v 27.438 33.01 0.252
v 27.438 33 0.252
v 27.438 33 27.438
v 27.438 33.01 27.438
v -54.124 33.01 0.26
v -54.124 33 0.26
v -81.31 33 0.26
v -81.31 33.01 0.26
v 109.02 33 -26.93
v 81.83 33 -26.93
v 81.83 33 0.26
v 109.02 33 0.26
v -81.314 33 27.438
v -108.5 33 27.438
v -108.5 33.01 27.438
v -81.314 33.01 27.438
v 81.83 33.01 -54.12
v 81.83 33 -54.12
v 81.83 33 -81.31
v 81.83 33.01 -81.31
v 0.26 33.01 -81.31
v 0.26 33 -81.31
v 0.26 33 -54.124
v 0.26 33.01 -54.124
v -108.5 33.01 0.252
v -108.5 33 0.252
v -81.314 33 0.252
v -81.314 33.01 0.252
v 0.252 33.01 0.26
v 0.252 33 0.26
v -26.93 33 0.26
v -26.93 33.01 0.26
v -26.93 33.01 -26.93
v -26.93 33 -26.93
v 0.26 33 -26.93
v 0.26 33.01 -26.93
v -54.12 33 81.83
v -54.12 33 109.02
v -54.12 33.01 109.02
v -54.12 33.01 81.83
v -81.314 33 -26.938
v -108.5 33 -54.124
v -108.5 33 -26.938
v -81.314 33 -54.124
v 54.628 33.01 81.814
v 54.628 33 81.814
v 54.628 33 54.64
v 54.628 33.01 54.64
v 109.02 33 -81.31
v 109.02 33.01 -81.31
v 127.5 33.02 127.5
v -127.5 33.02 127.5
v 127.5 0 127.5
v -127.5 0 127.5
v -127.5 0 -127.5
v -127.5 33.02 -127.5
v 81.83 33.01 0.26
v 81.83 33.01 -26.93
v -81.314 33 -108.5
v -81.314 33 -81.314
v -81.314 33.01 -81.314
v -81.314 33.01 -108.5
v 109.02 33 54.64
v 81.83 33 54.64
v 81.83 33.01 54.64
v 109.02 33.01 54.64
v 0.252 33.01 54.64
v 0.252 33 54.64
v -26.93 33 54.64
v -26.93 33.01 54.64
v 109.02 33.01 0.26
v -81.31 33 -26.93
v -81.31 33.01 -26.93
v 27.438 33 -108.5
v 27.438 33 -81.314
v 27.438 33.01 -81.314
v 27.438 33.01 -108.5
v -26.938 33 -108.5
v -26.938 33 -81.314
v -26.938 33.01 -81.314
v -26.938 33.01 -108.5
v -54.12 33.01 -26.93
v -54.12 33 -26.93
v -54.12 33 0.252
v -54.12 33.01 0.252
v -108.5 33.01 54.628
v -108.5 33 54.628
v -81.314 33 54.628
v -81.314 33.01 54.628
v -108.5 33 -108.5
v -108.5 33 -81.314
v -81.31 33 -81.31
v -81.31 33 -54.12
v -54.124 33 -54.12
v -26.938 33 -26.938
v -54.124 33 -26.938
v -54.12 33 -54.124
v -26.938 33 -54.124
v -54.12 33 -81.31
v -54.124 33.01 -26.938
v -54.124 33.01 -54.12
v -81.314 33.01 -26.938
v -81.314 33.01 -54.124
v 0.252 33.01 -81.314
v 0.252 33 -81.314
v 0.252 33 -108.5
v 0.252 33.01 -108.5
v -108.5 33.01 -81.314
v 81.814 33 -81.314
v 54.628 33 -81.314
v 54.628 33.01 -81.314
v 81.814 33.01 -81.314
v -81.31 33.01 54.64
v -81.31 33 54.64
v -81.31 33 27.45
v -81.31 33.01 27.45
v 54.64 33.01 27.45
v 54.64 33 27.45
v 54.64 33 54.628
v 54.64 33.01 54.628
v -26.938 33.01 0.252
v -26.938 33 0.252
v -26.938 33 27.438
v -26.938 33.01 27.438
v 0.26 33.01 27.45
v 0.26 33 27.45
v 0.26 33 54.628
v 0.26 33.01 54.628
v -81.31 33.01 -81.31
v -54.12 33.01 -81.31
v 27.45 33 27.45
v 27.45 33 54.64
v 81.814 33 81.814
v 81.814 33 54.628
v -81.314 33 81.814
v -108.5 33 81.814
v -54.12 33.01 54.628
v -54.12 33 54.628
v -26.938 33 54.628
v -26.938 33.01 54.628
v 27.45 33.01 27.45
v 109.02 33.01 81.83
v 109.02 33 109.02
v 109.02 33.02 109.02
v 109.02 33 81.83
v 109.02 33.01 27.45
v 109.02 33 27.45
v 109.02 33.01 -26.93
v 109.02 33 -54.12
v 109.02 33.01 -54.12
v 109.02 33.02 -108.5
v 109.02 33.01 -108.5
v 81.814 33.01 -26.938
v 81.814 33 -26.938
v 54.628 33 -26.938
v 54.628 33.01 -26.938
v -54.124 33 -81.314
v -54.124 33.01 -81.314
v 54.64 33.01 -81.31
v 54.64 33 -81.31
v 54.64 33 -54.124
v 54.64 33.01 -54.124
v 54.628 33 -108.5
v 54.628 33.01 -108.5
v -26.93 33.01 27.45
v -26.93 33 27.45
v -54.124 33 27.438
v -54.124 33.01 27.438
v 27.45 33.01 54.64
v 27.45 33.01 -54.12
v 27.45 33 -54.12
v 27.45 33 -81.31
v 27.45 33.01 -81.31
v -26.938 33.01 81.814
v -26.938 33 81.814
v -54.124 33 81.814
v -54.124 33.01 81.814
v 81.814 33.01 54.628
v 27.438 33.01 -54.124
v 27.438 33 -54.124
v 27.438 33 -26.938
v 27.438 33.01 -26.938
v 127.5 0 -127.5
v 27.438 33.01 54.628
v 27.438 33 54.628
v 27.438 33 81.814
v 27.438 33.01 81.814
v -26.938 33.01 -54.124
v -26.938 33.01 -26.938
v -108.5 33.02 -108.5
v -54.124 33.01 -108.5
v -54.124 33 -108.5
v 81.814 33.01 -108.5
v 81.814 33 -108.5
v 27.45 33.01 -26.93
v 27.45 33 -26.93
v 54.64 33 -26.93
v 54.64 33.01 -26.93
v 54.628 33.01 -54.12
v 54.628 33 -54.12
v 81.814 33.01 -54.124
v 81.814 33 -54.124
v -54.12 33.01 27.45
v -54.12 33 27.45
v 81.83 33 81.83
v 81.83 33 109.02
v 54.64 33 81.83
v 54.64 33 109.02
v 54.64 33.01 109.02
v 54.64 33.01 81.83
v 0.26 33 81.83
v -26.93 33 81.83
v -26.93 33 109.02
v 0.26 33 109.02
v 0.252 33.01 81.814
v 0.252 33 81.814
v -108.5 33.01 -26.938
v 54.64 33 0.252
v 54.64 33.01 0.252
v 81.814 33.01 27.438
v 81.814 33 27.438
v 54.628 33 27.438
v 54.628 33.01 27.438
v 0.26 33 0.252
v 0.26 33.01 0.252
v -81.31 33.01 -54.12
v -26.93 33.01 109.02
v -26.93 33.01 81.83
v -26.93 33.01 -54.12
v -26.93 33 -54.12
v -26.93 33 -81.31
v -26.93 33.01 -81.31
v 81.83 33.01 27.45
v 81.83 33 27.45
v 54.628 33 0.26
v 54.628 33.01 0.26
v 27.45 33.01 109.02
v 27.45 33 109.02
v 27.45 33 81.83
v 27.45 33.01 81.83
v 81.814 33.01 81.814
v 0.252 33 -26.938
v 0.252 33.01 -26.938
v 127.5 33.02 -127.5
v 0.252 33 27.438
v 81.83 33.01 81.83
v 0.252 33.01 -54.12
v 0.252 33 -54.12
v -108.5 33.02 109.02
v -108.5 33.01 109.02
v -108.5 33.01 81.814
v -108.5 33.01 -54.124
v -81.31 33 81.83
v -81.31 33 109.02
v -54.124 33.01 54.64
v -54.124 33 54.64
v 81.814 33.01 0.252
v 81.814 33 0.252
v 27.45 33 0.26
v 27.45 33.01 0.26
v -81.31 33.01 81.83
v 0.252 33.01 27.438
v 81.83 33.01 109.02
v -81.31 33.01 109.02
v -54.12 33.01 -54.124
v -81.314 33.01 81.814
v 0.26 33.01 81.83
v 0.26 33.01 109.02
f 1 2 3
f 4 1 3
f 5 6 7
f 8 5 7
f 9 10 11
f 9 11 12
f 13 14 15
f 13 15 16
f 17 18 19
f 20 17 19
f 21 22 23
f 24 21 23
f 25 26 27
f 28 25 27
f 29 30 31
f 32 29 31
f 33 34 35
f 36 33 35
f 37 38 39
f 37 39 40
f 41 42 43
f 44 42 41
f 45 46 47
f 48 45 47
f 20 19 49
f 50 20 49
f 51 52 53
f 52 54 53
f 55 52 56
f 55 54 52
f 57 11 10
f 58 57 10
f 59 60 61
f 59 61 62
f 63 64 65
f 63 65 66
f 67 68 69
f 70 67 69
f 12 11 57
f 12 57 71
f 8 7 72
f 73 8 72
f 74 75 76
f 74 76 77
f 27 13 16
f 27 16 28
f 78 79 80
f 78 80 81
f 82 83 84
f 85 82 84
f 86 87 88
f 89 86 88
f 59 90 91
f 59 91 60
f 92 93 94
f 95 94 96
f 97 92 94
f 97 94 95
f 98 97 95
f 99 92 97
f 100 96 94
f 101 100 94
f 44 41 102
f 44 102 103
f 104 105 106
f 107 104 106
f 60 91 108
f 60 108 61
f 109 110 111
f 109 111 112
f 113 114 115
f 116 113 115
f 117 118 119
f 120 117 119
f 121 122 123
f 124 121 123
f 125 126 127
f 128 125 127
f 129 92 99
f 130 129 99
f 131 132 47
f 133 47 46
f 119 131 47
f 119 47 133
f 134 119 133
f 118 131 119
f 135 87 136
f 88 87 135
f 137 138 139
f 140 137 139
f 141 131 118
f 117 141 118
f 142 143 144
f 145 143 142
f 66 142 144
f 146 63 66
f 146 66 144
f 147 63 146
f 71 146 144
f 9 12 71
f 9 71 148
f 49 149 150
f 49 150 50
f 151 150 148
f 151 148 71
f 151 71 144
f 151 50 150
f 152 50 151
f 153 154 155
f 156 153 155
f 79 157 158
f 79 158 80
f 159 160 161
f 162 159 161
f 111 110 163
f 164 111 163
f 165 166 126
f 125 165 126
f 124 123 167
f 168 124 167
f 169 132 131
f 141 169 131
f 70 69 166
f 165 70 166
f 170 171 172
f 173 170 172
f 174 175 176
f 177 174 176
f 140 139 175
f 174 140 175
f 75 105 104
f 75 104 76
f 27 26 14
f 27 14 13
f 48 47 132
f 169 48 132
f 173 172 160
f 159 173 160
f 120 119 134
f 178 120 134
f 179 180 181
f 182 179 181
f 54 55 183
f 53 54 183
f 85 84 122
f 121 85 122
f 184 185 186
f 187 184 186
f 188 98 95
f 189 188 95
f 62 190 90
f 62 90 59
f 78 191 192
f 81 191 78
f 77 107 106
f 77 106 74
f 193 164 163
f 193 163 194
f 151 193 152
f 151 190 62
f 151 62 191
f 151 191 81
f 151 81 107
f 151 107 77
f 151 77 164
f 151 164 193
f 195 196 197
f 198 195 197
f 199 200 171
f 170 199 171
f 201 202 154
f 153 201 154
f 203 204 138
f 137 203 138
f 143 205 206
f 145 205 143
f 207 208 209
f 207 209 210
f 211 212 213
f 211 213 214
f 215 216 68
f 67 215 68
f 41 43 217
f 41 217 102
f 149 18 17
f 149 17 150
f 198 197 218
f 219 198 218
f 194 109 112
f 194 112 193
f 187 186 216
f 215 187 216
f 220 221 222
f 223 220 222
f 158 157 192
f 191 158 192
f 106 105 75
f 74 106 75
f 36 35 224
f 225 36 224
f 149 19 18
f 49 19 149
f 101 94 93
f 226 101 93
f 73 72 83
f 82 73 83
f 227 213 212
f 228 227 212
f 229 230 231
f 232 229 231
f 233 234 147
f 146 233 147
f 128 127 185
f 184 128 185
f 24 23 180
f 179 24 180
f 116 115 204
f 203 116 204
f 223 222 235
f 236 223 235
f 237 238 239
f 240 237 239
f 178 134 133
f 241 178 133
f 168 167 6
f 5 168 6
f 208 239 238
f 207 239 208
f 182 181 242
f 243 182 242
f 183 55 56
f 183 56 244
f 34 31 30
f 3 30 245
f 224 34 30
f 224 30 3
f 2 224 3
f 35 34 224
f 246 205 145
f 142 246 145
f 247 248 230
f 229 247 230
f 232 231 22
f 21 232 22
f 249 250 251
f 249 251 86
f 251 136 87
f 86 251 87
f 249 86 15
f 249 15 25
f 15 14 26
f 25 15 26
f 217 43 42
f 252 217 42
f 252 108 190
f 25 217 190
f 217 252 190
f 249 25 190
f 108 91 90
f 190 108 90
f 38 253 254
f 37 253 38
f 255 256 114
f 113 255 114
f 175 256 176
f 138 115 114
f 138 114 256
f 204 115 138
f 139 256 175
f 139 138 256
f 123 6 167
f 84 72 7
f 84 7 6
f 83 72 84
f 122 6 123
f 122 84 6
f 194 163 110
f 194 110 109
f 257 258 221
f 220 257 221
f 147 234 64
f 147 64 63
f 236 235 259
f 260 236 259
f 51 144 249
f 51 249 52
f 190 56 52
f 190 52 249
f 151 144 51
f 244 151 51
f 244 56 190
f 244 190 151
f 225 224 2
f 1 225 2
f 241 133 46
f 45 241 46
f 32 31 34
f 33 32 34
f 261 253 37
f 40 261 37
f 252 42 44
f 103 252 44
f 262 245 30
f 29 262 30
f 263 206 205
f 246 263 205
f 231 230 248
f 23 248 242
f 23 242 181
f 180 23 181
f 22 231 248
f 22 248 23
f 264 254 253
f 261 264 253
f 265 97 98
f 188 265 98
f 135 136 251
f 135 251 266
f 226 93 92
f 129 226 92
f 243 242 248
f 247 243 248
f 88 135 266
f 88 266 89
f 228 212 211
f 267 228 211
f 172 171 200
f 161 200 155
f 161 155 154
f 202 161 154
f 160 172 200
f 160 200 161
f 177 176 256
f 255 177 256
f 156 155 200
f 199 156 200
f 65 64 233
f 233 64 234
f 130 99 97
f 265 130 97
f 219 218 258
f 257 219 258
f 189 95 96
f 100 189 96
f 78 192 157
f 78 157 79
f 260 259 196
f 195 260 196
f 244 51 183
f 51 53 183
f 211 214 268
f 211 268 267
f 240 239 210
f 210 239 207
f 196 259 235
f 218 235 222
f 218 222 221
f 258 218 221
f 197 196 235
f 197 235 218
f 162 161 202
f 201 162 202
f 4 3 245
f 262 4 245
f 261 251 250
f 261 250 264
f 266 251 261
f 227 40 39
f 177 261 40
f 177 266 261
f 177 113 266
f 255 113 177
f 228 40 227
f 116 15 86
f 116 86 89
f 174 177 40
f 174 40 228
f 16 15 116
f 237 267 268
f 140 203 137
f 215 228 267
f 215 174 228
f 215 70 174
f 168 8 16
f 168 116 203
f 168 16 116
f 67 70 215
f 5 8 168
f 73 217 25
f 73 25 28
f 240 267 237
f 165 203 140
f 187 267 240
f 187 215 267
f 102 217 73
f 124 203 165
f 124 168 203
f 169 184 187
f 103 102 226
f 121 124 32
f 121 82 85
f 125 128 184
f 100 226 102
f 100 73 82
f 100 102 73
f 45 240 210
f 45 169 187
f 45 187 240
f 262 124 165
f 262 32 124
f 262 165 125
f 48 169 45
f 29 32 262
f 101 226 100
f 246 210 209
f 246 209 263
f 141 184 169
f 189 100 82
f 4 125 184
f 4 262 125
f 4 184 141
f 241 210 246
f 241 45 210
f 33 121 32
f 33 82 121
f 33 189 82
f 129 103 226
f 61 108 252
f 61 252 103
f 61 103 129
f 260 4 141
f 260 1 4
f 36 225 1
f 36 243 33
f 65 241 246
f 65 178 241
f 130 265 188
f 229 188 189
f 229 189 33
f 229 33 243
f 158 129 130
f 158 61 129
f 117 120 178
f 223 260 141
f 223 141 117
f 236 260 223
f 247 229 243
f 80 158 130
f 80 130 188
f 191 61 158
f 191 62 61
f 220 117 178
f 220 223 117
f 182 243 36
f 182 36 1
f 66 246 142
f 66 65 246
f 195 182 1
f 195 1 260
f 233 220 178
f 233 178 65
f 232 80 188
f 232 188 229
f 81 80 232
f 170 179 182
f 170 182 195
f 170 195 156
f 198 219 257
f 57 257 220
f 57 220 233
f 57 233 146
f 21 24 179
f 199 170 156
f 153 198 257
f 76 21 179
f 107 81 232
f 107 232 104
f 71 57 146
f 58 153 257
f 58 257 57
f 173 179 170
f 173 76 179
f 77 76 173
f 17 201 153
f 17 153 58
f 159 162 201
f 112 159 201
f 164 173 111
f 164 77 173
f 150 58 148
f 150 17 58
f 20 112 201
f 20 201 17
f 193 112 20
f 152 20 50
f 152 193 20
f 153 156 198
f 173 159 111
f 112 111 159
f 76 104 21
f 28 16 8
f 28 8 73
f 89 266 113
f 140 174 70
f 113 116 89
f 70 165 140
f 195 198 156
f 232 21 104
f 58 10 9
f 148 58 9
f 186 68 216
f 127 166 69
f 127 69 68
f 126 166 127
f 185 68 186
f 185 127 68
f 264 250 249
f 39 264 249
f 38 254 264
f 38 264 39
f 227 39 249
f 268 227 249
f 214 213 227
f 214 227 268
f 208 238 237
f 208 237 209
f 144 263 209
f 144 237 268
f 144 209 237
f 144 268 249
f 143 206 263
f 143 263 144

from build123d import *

# Parameters (mm, degrees)
SKETCH1_W           = 255
SKETCH1_H           = 255
BOSS_EXTRUDE1_DEPTH = 33
SKETCH2_W           = 255
SKETCH2_H           = 255
SKETCH2_W_2         = 27.1859502
SKETCH2_H_2         = 27.1859502
SKETCH2_W_3         = 27.19
SKETCH2_H_3         = 27.19
BOSS_EXTRUDE3_DEPTH = 0.02
SKETCH3_W           = 217.52
SKETCH3_H           = 217.52
CUT_EXTRUDE4_DEPTH  = 0.01


with BuildPart() as part:
    # Sketch1 → Boss-Extrude1 (new body)
    with BuildSketch(Plane(origin=(0, 0, 0), x_dir=(1, 0, 0), z_dir=(0, 1, 0))):
        Rectangle(SKETCH1_W, SKETCH1_H)
    extrude(amount=BOSS_EXTRUDE1_DEPTH)

    # Sketch2 → Boss-Extrude3 (add)
    with BuildSketch(Plane(origin=(0, 33, 0), x_dir=(1, 0, 0), z_dir=(0, 1, 0))):
        Rectangle(SKETCH2_W, SKETCH2_H)
        with Locations((-94.9070249, -68.2208257)):
            Rectangle(SKETCH2_W_2, SKETCH2_H_2, mode=Mode.SUBTRACT)
        with Locations((-94.9070249, -13.8448755)):
            Rectangle(SKETCH2_W_2, SKETCH2_H_2, mode=Mode.SUBTRACT)
        with Locations((-94.9070249, 40.5310747)):
            Rectangle(SKETCH2_W_2, SKETCH2_H_2, mode=Mode.SUBTRACT)
        with Locations((-94.9070249, 94.9070249)):
            Rectangle(SKETCH2_W_2, SKETCH2_H_2, mode=Mode.SUBTRACT)
        with Locations((-67.715, -95.425)):
            Rectangle(SKETCH2_W_3, SKETCH2_H_3, mode=Mode.SUBTRACT)
        with Locations((-13.335, -95.425)):
            Rectangle(SKETCH2_W_3, SKETCH2_H_3, mode=Mode.SUBTRACT)
        Polygon((-54.12, -27.45), (-54.12, -54.6278506), (-26.9380996, -54.6278506), (-26.9380996, -81.8138008), (-54.1240498, -81.8138008), (-54.1240498, -54.64), (-81.31, -54.64), (-81.31, -27.45), align=None, mode=Mode.SUBTRACT)
        Polygon((-54.12, 26.93), (-54.12, -0.2519004), (-26.9380996, -0.2519004), (-26.9380996, -27.4378506), (-54.1240498, -27.4378506), (-54.1240498, -0.26), (-81.31, -0.26), (-81.31, 26.93), align=None, mode=Mode.SUBTRACT)
        with Locations((41.045, -95.425)):
            Rectangle(SKETCH2_W_3, SKETCH2_H_3, mode=Mode.SUBTRACT)
        with Locations((95.425, -95.425)):
            Rectangle(SKETCH2_W_3, SKETCH2_H_3, mode=Mode.SUBTRACT)
        Polygon((0.26, -27.45), (0.26, -54.6278506), (27.4378506, -54.6278506), (27.4378506, -81.8138008), (0.2519004, -81.8138008), (0.2519004, -54.64), (-26.93, -54.64), (-26.93, -27.45), align=None, mode=Mode.SUBTRACT)
        Polygon((54.64, -27.45), (54.64, -54.6278506), (81.8138008, -54.6278506), (81.8138008, -81.8138008), (54.6278506, -81.8138008), (54.6278506, -54.64), (27.45, -54.64), (27.45, -27.45), align=None, mode=Mode.SUBTRACT)
        Polygon((0.26, 26.93), (0.26, -0.2519004), (27.4378506, -0.2519004), (27.4378506, -27.4378506), (0.2519004, -27.4378506), (0.2519004, -0.26), (-26.93, -0.26), (-26.93, 26.93), align=None, mode=Mode.SUBTRACT)
        Polygon((54.64, 26.93), (54.64, -0.2519004), (81.8138008, -0.2519004), (81.8138008, -27.4378506), (54.6278506, -27.4378506), (54.6278506, -0.26), (27.45, -0.26), (27.45, 26.93), align=None, mode=Mode.SUBTRACT)
        with Locations((95.425, -41.045)):
            Rectangle(SKETCH2_W_3, SKETCH2_H_3, mode=Mode.SUBTRACT)
        Polygon((-54.12, 81.31), (-54.12, 54.1240498), (-26.9380996, 54.1240498), (-26.9380996, 26.9380996), (-54.1240498, 26.9380996), (-54.1240498, 54.12), (-81.31, 54.12), (-81.31, 81.31), align=None, mode=Mode.SUBTRACT)
        with Locations((-40.5310747, 94.9070249)):
            Rectangle(SKETCH2_W_2, SKETCH2_H_2, mode=Mode.SUBTRACT)
        Polygon((0.26, 81.31), (0.26, 54.1240498), (27.4378506, 54.1240498), (27.4378506, 26.9380996), (0.2519004, 26.9380996), (0.2519004, 54.12), (-26.93, 54.12), (-26.93, 81.31), align=None, mode=Mode.SUBTRACT)
        Polygon((54.64, 81.31), (54.64, 54.1240498), (81.8138008, 54.1240498), (81.8138008, 26.9380996), (54.6278506, 26.9380996), (54.6278506, 54.12), (27.45, 54.12), (27.45, 81.31), align=None, mode=Mode.SUBTRACT)
        with Locations((95.425, 13.335)):
            Rectangle(SKETCH2_W_3, SKETCH2_H_3, mode=Mode.SUBTRACT)
        with Locations((13.8448755, 94.9070249)):
            Rectangle(SKETCH2_W_2, SKETCH2_H_2, mode=Mode.SUBTRACT)
        with Locations((95.425, 67.715)):
            Rectangle(SKETCH2_W_3, SKETCH2_H_3, mode=Mode.SUBTRACT)
        with Locations((68.2208257, 94.9070249)):
            Rectangle(SKETCH2_W_2, SKETCH2_H_2, mode=Mode.SUBTRACT)
    extrude(amount=BOSS_EXTRUDE3_DEPTH)

    # Sketch3 → Cut-Extrude4 (cut)
    with BuildSketch(Plane(origin=(0, 33.02, 0), x_dir=(1, 0, 0), z_dir=(0, 1, 0))):
        with Locations((0.26, -0.26)):
            Rectangle(SKETCH3_W, SKETCH3_H)
    extrude(amount=-CUT_EXTRUDE4_DEPTH, mode=Mode.SUBTRACT)


solid = part.part
